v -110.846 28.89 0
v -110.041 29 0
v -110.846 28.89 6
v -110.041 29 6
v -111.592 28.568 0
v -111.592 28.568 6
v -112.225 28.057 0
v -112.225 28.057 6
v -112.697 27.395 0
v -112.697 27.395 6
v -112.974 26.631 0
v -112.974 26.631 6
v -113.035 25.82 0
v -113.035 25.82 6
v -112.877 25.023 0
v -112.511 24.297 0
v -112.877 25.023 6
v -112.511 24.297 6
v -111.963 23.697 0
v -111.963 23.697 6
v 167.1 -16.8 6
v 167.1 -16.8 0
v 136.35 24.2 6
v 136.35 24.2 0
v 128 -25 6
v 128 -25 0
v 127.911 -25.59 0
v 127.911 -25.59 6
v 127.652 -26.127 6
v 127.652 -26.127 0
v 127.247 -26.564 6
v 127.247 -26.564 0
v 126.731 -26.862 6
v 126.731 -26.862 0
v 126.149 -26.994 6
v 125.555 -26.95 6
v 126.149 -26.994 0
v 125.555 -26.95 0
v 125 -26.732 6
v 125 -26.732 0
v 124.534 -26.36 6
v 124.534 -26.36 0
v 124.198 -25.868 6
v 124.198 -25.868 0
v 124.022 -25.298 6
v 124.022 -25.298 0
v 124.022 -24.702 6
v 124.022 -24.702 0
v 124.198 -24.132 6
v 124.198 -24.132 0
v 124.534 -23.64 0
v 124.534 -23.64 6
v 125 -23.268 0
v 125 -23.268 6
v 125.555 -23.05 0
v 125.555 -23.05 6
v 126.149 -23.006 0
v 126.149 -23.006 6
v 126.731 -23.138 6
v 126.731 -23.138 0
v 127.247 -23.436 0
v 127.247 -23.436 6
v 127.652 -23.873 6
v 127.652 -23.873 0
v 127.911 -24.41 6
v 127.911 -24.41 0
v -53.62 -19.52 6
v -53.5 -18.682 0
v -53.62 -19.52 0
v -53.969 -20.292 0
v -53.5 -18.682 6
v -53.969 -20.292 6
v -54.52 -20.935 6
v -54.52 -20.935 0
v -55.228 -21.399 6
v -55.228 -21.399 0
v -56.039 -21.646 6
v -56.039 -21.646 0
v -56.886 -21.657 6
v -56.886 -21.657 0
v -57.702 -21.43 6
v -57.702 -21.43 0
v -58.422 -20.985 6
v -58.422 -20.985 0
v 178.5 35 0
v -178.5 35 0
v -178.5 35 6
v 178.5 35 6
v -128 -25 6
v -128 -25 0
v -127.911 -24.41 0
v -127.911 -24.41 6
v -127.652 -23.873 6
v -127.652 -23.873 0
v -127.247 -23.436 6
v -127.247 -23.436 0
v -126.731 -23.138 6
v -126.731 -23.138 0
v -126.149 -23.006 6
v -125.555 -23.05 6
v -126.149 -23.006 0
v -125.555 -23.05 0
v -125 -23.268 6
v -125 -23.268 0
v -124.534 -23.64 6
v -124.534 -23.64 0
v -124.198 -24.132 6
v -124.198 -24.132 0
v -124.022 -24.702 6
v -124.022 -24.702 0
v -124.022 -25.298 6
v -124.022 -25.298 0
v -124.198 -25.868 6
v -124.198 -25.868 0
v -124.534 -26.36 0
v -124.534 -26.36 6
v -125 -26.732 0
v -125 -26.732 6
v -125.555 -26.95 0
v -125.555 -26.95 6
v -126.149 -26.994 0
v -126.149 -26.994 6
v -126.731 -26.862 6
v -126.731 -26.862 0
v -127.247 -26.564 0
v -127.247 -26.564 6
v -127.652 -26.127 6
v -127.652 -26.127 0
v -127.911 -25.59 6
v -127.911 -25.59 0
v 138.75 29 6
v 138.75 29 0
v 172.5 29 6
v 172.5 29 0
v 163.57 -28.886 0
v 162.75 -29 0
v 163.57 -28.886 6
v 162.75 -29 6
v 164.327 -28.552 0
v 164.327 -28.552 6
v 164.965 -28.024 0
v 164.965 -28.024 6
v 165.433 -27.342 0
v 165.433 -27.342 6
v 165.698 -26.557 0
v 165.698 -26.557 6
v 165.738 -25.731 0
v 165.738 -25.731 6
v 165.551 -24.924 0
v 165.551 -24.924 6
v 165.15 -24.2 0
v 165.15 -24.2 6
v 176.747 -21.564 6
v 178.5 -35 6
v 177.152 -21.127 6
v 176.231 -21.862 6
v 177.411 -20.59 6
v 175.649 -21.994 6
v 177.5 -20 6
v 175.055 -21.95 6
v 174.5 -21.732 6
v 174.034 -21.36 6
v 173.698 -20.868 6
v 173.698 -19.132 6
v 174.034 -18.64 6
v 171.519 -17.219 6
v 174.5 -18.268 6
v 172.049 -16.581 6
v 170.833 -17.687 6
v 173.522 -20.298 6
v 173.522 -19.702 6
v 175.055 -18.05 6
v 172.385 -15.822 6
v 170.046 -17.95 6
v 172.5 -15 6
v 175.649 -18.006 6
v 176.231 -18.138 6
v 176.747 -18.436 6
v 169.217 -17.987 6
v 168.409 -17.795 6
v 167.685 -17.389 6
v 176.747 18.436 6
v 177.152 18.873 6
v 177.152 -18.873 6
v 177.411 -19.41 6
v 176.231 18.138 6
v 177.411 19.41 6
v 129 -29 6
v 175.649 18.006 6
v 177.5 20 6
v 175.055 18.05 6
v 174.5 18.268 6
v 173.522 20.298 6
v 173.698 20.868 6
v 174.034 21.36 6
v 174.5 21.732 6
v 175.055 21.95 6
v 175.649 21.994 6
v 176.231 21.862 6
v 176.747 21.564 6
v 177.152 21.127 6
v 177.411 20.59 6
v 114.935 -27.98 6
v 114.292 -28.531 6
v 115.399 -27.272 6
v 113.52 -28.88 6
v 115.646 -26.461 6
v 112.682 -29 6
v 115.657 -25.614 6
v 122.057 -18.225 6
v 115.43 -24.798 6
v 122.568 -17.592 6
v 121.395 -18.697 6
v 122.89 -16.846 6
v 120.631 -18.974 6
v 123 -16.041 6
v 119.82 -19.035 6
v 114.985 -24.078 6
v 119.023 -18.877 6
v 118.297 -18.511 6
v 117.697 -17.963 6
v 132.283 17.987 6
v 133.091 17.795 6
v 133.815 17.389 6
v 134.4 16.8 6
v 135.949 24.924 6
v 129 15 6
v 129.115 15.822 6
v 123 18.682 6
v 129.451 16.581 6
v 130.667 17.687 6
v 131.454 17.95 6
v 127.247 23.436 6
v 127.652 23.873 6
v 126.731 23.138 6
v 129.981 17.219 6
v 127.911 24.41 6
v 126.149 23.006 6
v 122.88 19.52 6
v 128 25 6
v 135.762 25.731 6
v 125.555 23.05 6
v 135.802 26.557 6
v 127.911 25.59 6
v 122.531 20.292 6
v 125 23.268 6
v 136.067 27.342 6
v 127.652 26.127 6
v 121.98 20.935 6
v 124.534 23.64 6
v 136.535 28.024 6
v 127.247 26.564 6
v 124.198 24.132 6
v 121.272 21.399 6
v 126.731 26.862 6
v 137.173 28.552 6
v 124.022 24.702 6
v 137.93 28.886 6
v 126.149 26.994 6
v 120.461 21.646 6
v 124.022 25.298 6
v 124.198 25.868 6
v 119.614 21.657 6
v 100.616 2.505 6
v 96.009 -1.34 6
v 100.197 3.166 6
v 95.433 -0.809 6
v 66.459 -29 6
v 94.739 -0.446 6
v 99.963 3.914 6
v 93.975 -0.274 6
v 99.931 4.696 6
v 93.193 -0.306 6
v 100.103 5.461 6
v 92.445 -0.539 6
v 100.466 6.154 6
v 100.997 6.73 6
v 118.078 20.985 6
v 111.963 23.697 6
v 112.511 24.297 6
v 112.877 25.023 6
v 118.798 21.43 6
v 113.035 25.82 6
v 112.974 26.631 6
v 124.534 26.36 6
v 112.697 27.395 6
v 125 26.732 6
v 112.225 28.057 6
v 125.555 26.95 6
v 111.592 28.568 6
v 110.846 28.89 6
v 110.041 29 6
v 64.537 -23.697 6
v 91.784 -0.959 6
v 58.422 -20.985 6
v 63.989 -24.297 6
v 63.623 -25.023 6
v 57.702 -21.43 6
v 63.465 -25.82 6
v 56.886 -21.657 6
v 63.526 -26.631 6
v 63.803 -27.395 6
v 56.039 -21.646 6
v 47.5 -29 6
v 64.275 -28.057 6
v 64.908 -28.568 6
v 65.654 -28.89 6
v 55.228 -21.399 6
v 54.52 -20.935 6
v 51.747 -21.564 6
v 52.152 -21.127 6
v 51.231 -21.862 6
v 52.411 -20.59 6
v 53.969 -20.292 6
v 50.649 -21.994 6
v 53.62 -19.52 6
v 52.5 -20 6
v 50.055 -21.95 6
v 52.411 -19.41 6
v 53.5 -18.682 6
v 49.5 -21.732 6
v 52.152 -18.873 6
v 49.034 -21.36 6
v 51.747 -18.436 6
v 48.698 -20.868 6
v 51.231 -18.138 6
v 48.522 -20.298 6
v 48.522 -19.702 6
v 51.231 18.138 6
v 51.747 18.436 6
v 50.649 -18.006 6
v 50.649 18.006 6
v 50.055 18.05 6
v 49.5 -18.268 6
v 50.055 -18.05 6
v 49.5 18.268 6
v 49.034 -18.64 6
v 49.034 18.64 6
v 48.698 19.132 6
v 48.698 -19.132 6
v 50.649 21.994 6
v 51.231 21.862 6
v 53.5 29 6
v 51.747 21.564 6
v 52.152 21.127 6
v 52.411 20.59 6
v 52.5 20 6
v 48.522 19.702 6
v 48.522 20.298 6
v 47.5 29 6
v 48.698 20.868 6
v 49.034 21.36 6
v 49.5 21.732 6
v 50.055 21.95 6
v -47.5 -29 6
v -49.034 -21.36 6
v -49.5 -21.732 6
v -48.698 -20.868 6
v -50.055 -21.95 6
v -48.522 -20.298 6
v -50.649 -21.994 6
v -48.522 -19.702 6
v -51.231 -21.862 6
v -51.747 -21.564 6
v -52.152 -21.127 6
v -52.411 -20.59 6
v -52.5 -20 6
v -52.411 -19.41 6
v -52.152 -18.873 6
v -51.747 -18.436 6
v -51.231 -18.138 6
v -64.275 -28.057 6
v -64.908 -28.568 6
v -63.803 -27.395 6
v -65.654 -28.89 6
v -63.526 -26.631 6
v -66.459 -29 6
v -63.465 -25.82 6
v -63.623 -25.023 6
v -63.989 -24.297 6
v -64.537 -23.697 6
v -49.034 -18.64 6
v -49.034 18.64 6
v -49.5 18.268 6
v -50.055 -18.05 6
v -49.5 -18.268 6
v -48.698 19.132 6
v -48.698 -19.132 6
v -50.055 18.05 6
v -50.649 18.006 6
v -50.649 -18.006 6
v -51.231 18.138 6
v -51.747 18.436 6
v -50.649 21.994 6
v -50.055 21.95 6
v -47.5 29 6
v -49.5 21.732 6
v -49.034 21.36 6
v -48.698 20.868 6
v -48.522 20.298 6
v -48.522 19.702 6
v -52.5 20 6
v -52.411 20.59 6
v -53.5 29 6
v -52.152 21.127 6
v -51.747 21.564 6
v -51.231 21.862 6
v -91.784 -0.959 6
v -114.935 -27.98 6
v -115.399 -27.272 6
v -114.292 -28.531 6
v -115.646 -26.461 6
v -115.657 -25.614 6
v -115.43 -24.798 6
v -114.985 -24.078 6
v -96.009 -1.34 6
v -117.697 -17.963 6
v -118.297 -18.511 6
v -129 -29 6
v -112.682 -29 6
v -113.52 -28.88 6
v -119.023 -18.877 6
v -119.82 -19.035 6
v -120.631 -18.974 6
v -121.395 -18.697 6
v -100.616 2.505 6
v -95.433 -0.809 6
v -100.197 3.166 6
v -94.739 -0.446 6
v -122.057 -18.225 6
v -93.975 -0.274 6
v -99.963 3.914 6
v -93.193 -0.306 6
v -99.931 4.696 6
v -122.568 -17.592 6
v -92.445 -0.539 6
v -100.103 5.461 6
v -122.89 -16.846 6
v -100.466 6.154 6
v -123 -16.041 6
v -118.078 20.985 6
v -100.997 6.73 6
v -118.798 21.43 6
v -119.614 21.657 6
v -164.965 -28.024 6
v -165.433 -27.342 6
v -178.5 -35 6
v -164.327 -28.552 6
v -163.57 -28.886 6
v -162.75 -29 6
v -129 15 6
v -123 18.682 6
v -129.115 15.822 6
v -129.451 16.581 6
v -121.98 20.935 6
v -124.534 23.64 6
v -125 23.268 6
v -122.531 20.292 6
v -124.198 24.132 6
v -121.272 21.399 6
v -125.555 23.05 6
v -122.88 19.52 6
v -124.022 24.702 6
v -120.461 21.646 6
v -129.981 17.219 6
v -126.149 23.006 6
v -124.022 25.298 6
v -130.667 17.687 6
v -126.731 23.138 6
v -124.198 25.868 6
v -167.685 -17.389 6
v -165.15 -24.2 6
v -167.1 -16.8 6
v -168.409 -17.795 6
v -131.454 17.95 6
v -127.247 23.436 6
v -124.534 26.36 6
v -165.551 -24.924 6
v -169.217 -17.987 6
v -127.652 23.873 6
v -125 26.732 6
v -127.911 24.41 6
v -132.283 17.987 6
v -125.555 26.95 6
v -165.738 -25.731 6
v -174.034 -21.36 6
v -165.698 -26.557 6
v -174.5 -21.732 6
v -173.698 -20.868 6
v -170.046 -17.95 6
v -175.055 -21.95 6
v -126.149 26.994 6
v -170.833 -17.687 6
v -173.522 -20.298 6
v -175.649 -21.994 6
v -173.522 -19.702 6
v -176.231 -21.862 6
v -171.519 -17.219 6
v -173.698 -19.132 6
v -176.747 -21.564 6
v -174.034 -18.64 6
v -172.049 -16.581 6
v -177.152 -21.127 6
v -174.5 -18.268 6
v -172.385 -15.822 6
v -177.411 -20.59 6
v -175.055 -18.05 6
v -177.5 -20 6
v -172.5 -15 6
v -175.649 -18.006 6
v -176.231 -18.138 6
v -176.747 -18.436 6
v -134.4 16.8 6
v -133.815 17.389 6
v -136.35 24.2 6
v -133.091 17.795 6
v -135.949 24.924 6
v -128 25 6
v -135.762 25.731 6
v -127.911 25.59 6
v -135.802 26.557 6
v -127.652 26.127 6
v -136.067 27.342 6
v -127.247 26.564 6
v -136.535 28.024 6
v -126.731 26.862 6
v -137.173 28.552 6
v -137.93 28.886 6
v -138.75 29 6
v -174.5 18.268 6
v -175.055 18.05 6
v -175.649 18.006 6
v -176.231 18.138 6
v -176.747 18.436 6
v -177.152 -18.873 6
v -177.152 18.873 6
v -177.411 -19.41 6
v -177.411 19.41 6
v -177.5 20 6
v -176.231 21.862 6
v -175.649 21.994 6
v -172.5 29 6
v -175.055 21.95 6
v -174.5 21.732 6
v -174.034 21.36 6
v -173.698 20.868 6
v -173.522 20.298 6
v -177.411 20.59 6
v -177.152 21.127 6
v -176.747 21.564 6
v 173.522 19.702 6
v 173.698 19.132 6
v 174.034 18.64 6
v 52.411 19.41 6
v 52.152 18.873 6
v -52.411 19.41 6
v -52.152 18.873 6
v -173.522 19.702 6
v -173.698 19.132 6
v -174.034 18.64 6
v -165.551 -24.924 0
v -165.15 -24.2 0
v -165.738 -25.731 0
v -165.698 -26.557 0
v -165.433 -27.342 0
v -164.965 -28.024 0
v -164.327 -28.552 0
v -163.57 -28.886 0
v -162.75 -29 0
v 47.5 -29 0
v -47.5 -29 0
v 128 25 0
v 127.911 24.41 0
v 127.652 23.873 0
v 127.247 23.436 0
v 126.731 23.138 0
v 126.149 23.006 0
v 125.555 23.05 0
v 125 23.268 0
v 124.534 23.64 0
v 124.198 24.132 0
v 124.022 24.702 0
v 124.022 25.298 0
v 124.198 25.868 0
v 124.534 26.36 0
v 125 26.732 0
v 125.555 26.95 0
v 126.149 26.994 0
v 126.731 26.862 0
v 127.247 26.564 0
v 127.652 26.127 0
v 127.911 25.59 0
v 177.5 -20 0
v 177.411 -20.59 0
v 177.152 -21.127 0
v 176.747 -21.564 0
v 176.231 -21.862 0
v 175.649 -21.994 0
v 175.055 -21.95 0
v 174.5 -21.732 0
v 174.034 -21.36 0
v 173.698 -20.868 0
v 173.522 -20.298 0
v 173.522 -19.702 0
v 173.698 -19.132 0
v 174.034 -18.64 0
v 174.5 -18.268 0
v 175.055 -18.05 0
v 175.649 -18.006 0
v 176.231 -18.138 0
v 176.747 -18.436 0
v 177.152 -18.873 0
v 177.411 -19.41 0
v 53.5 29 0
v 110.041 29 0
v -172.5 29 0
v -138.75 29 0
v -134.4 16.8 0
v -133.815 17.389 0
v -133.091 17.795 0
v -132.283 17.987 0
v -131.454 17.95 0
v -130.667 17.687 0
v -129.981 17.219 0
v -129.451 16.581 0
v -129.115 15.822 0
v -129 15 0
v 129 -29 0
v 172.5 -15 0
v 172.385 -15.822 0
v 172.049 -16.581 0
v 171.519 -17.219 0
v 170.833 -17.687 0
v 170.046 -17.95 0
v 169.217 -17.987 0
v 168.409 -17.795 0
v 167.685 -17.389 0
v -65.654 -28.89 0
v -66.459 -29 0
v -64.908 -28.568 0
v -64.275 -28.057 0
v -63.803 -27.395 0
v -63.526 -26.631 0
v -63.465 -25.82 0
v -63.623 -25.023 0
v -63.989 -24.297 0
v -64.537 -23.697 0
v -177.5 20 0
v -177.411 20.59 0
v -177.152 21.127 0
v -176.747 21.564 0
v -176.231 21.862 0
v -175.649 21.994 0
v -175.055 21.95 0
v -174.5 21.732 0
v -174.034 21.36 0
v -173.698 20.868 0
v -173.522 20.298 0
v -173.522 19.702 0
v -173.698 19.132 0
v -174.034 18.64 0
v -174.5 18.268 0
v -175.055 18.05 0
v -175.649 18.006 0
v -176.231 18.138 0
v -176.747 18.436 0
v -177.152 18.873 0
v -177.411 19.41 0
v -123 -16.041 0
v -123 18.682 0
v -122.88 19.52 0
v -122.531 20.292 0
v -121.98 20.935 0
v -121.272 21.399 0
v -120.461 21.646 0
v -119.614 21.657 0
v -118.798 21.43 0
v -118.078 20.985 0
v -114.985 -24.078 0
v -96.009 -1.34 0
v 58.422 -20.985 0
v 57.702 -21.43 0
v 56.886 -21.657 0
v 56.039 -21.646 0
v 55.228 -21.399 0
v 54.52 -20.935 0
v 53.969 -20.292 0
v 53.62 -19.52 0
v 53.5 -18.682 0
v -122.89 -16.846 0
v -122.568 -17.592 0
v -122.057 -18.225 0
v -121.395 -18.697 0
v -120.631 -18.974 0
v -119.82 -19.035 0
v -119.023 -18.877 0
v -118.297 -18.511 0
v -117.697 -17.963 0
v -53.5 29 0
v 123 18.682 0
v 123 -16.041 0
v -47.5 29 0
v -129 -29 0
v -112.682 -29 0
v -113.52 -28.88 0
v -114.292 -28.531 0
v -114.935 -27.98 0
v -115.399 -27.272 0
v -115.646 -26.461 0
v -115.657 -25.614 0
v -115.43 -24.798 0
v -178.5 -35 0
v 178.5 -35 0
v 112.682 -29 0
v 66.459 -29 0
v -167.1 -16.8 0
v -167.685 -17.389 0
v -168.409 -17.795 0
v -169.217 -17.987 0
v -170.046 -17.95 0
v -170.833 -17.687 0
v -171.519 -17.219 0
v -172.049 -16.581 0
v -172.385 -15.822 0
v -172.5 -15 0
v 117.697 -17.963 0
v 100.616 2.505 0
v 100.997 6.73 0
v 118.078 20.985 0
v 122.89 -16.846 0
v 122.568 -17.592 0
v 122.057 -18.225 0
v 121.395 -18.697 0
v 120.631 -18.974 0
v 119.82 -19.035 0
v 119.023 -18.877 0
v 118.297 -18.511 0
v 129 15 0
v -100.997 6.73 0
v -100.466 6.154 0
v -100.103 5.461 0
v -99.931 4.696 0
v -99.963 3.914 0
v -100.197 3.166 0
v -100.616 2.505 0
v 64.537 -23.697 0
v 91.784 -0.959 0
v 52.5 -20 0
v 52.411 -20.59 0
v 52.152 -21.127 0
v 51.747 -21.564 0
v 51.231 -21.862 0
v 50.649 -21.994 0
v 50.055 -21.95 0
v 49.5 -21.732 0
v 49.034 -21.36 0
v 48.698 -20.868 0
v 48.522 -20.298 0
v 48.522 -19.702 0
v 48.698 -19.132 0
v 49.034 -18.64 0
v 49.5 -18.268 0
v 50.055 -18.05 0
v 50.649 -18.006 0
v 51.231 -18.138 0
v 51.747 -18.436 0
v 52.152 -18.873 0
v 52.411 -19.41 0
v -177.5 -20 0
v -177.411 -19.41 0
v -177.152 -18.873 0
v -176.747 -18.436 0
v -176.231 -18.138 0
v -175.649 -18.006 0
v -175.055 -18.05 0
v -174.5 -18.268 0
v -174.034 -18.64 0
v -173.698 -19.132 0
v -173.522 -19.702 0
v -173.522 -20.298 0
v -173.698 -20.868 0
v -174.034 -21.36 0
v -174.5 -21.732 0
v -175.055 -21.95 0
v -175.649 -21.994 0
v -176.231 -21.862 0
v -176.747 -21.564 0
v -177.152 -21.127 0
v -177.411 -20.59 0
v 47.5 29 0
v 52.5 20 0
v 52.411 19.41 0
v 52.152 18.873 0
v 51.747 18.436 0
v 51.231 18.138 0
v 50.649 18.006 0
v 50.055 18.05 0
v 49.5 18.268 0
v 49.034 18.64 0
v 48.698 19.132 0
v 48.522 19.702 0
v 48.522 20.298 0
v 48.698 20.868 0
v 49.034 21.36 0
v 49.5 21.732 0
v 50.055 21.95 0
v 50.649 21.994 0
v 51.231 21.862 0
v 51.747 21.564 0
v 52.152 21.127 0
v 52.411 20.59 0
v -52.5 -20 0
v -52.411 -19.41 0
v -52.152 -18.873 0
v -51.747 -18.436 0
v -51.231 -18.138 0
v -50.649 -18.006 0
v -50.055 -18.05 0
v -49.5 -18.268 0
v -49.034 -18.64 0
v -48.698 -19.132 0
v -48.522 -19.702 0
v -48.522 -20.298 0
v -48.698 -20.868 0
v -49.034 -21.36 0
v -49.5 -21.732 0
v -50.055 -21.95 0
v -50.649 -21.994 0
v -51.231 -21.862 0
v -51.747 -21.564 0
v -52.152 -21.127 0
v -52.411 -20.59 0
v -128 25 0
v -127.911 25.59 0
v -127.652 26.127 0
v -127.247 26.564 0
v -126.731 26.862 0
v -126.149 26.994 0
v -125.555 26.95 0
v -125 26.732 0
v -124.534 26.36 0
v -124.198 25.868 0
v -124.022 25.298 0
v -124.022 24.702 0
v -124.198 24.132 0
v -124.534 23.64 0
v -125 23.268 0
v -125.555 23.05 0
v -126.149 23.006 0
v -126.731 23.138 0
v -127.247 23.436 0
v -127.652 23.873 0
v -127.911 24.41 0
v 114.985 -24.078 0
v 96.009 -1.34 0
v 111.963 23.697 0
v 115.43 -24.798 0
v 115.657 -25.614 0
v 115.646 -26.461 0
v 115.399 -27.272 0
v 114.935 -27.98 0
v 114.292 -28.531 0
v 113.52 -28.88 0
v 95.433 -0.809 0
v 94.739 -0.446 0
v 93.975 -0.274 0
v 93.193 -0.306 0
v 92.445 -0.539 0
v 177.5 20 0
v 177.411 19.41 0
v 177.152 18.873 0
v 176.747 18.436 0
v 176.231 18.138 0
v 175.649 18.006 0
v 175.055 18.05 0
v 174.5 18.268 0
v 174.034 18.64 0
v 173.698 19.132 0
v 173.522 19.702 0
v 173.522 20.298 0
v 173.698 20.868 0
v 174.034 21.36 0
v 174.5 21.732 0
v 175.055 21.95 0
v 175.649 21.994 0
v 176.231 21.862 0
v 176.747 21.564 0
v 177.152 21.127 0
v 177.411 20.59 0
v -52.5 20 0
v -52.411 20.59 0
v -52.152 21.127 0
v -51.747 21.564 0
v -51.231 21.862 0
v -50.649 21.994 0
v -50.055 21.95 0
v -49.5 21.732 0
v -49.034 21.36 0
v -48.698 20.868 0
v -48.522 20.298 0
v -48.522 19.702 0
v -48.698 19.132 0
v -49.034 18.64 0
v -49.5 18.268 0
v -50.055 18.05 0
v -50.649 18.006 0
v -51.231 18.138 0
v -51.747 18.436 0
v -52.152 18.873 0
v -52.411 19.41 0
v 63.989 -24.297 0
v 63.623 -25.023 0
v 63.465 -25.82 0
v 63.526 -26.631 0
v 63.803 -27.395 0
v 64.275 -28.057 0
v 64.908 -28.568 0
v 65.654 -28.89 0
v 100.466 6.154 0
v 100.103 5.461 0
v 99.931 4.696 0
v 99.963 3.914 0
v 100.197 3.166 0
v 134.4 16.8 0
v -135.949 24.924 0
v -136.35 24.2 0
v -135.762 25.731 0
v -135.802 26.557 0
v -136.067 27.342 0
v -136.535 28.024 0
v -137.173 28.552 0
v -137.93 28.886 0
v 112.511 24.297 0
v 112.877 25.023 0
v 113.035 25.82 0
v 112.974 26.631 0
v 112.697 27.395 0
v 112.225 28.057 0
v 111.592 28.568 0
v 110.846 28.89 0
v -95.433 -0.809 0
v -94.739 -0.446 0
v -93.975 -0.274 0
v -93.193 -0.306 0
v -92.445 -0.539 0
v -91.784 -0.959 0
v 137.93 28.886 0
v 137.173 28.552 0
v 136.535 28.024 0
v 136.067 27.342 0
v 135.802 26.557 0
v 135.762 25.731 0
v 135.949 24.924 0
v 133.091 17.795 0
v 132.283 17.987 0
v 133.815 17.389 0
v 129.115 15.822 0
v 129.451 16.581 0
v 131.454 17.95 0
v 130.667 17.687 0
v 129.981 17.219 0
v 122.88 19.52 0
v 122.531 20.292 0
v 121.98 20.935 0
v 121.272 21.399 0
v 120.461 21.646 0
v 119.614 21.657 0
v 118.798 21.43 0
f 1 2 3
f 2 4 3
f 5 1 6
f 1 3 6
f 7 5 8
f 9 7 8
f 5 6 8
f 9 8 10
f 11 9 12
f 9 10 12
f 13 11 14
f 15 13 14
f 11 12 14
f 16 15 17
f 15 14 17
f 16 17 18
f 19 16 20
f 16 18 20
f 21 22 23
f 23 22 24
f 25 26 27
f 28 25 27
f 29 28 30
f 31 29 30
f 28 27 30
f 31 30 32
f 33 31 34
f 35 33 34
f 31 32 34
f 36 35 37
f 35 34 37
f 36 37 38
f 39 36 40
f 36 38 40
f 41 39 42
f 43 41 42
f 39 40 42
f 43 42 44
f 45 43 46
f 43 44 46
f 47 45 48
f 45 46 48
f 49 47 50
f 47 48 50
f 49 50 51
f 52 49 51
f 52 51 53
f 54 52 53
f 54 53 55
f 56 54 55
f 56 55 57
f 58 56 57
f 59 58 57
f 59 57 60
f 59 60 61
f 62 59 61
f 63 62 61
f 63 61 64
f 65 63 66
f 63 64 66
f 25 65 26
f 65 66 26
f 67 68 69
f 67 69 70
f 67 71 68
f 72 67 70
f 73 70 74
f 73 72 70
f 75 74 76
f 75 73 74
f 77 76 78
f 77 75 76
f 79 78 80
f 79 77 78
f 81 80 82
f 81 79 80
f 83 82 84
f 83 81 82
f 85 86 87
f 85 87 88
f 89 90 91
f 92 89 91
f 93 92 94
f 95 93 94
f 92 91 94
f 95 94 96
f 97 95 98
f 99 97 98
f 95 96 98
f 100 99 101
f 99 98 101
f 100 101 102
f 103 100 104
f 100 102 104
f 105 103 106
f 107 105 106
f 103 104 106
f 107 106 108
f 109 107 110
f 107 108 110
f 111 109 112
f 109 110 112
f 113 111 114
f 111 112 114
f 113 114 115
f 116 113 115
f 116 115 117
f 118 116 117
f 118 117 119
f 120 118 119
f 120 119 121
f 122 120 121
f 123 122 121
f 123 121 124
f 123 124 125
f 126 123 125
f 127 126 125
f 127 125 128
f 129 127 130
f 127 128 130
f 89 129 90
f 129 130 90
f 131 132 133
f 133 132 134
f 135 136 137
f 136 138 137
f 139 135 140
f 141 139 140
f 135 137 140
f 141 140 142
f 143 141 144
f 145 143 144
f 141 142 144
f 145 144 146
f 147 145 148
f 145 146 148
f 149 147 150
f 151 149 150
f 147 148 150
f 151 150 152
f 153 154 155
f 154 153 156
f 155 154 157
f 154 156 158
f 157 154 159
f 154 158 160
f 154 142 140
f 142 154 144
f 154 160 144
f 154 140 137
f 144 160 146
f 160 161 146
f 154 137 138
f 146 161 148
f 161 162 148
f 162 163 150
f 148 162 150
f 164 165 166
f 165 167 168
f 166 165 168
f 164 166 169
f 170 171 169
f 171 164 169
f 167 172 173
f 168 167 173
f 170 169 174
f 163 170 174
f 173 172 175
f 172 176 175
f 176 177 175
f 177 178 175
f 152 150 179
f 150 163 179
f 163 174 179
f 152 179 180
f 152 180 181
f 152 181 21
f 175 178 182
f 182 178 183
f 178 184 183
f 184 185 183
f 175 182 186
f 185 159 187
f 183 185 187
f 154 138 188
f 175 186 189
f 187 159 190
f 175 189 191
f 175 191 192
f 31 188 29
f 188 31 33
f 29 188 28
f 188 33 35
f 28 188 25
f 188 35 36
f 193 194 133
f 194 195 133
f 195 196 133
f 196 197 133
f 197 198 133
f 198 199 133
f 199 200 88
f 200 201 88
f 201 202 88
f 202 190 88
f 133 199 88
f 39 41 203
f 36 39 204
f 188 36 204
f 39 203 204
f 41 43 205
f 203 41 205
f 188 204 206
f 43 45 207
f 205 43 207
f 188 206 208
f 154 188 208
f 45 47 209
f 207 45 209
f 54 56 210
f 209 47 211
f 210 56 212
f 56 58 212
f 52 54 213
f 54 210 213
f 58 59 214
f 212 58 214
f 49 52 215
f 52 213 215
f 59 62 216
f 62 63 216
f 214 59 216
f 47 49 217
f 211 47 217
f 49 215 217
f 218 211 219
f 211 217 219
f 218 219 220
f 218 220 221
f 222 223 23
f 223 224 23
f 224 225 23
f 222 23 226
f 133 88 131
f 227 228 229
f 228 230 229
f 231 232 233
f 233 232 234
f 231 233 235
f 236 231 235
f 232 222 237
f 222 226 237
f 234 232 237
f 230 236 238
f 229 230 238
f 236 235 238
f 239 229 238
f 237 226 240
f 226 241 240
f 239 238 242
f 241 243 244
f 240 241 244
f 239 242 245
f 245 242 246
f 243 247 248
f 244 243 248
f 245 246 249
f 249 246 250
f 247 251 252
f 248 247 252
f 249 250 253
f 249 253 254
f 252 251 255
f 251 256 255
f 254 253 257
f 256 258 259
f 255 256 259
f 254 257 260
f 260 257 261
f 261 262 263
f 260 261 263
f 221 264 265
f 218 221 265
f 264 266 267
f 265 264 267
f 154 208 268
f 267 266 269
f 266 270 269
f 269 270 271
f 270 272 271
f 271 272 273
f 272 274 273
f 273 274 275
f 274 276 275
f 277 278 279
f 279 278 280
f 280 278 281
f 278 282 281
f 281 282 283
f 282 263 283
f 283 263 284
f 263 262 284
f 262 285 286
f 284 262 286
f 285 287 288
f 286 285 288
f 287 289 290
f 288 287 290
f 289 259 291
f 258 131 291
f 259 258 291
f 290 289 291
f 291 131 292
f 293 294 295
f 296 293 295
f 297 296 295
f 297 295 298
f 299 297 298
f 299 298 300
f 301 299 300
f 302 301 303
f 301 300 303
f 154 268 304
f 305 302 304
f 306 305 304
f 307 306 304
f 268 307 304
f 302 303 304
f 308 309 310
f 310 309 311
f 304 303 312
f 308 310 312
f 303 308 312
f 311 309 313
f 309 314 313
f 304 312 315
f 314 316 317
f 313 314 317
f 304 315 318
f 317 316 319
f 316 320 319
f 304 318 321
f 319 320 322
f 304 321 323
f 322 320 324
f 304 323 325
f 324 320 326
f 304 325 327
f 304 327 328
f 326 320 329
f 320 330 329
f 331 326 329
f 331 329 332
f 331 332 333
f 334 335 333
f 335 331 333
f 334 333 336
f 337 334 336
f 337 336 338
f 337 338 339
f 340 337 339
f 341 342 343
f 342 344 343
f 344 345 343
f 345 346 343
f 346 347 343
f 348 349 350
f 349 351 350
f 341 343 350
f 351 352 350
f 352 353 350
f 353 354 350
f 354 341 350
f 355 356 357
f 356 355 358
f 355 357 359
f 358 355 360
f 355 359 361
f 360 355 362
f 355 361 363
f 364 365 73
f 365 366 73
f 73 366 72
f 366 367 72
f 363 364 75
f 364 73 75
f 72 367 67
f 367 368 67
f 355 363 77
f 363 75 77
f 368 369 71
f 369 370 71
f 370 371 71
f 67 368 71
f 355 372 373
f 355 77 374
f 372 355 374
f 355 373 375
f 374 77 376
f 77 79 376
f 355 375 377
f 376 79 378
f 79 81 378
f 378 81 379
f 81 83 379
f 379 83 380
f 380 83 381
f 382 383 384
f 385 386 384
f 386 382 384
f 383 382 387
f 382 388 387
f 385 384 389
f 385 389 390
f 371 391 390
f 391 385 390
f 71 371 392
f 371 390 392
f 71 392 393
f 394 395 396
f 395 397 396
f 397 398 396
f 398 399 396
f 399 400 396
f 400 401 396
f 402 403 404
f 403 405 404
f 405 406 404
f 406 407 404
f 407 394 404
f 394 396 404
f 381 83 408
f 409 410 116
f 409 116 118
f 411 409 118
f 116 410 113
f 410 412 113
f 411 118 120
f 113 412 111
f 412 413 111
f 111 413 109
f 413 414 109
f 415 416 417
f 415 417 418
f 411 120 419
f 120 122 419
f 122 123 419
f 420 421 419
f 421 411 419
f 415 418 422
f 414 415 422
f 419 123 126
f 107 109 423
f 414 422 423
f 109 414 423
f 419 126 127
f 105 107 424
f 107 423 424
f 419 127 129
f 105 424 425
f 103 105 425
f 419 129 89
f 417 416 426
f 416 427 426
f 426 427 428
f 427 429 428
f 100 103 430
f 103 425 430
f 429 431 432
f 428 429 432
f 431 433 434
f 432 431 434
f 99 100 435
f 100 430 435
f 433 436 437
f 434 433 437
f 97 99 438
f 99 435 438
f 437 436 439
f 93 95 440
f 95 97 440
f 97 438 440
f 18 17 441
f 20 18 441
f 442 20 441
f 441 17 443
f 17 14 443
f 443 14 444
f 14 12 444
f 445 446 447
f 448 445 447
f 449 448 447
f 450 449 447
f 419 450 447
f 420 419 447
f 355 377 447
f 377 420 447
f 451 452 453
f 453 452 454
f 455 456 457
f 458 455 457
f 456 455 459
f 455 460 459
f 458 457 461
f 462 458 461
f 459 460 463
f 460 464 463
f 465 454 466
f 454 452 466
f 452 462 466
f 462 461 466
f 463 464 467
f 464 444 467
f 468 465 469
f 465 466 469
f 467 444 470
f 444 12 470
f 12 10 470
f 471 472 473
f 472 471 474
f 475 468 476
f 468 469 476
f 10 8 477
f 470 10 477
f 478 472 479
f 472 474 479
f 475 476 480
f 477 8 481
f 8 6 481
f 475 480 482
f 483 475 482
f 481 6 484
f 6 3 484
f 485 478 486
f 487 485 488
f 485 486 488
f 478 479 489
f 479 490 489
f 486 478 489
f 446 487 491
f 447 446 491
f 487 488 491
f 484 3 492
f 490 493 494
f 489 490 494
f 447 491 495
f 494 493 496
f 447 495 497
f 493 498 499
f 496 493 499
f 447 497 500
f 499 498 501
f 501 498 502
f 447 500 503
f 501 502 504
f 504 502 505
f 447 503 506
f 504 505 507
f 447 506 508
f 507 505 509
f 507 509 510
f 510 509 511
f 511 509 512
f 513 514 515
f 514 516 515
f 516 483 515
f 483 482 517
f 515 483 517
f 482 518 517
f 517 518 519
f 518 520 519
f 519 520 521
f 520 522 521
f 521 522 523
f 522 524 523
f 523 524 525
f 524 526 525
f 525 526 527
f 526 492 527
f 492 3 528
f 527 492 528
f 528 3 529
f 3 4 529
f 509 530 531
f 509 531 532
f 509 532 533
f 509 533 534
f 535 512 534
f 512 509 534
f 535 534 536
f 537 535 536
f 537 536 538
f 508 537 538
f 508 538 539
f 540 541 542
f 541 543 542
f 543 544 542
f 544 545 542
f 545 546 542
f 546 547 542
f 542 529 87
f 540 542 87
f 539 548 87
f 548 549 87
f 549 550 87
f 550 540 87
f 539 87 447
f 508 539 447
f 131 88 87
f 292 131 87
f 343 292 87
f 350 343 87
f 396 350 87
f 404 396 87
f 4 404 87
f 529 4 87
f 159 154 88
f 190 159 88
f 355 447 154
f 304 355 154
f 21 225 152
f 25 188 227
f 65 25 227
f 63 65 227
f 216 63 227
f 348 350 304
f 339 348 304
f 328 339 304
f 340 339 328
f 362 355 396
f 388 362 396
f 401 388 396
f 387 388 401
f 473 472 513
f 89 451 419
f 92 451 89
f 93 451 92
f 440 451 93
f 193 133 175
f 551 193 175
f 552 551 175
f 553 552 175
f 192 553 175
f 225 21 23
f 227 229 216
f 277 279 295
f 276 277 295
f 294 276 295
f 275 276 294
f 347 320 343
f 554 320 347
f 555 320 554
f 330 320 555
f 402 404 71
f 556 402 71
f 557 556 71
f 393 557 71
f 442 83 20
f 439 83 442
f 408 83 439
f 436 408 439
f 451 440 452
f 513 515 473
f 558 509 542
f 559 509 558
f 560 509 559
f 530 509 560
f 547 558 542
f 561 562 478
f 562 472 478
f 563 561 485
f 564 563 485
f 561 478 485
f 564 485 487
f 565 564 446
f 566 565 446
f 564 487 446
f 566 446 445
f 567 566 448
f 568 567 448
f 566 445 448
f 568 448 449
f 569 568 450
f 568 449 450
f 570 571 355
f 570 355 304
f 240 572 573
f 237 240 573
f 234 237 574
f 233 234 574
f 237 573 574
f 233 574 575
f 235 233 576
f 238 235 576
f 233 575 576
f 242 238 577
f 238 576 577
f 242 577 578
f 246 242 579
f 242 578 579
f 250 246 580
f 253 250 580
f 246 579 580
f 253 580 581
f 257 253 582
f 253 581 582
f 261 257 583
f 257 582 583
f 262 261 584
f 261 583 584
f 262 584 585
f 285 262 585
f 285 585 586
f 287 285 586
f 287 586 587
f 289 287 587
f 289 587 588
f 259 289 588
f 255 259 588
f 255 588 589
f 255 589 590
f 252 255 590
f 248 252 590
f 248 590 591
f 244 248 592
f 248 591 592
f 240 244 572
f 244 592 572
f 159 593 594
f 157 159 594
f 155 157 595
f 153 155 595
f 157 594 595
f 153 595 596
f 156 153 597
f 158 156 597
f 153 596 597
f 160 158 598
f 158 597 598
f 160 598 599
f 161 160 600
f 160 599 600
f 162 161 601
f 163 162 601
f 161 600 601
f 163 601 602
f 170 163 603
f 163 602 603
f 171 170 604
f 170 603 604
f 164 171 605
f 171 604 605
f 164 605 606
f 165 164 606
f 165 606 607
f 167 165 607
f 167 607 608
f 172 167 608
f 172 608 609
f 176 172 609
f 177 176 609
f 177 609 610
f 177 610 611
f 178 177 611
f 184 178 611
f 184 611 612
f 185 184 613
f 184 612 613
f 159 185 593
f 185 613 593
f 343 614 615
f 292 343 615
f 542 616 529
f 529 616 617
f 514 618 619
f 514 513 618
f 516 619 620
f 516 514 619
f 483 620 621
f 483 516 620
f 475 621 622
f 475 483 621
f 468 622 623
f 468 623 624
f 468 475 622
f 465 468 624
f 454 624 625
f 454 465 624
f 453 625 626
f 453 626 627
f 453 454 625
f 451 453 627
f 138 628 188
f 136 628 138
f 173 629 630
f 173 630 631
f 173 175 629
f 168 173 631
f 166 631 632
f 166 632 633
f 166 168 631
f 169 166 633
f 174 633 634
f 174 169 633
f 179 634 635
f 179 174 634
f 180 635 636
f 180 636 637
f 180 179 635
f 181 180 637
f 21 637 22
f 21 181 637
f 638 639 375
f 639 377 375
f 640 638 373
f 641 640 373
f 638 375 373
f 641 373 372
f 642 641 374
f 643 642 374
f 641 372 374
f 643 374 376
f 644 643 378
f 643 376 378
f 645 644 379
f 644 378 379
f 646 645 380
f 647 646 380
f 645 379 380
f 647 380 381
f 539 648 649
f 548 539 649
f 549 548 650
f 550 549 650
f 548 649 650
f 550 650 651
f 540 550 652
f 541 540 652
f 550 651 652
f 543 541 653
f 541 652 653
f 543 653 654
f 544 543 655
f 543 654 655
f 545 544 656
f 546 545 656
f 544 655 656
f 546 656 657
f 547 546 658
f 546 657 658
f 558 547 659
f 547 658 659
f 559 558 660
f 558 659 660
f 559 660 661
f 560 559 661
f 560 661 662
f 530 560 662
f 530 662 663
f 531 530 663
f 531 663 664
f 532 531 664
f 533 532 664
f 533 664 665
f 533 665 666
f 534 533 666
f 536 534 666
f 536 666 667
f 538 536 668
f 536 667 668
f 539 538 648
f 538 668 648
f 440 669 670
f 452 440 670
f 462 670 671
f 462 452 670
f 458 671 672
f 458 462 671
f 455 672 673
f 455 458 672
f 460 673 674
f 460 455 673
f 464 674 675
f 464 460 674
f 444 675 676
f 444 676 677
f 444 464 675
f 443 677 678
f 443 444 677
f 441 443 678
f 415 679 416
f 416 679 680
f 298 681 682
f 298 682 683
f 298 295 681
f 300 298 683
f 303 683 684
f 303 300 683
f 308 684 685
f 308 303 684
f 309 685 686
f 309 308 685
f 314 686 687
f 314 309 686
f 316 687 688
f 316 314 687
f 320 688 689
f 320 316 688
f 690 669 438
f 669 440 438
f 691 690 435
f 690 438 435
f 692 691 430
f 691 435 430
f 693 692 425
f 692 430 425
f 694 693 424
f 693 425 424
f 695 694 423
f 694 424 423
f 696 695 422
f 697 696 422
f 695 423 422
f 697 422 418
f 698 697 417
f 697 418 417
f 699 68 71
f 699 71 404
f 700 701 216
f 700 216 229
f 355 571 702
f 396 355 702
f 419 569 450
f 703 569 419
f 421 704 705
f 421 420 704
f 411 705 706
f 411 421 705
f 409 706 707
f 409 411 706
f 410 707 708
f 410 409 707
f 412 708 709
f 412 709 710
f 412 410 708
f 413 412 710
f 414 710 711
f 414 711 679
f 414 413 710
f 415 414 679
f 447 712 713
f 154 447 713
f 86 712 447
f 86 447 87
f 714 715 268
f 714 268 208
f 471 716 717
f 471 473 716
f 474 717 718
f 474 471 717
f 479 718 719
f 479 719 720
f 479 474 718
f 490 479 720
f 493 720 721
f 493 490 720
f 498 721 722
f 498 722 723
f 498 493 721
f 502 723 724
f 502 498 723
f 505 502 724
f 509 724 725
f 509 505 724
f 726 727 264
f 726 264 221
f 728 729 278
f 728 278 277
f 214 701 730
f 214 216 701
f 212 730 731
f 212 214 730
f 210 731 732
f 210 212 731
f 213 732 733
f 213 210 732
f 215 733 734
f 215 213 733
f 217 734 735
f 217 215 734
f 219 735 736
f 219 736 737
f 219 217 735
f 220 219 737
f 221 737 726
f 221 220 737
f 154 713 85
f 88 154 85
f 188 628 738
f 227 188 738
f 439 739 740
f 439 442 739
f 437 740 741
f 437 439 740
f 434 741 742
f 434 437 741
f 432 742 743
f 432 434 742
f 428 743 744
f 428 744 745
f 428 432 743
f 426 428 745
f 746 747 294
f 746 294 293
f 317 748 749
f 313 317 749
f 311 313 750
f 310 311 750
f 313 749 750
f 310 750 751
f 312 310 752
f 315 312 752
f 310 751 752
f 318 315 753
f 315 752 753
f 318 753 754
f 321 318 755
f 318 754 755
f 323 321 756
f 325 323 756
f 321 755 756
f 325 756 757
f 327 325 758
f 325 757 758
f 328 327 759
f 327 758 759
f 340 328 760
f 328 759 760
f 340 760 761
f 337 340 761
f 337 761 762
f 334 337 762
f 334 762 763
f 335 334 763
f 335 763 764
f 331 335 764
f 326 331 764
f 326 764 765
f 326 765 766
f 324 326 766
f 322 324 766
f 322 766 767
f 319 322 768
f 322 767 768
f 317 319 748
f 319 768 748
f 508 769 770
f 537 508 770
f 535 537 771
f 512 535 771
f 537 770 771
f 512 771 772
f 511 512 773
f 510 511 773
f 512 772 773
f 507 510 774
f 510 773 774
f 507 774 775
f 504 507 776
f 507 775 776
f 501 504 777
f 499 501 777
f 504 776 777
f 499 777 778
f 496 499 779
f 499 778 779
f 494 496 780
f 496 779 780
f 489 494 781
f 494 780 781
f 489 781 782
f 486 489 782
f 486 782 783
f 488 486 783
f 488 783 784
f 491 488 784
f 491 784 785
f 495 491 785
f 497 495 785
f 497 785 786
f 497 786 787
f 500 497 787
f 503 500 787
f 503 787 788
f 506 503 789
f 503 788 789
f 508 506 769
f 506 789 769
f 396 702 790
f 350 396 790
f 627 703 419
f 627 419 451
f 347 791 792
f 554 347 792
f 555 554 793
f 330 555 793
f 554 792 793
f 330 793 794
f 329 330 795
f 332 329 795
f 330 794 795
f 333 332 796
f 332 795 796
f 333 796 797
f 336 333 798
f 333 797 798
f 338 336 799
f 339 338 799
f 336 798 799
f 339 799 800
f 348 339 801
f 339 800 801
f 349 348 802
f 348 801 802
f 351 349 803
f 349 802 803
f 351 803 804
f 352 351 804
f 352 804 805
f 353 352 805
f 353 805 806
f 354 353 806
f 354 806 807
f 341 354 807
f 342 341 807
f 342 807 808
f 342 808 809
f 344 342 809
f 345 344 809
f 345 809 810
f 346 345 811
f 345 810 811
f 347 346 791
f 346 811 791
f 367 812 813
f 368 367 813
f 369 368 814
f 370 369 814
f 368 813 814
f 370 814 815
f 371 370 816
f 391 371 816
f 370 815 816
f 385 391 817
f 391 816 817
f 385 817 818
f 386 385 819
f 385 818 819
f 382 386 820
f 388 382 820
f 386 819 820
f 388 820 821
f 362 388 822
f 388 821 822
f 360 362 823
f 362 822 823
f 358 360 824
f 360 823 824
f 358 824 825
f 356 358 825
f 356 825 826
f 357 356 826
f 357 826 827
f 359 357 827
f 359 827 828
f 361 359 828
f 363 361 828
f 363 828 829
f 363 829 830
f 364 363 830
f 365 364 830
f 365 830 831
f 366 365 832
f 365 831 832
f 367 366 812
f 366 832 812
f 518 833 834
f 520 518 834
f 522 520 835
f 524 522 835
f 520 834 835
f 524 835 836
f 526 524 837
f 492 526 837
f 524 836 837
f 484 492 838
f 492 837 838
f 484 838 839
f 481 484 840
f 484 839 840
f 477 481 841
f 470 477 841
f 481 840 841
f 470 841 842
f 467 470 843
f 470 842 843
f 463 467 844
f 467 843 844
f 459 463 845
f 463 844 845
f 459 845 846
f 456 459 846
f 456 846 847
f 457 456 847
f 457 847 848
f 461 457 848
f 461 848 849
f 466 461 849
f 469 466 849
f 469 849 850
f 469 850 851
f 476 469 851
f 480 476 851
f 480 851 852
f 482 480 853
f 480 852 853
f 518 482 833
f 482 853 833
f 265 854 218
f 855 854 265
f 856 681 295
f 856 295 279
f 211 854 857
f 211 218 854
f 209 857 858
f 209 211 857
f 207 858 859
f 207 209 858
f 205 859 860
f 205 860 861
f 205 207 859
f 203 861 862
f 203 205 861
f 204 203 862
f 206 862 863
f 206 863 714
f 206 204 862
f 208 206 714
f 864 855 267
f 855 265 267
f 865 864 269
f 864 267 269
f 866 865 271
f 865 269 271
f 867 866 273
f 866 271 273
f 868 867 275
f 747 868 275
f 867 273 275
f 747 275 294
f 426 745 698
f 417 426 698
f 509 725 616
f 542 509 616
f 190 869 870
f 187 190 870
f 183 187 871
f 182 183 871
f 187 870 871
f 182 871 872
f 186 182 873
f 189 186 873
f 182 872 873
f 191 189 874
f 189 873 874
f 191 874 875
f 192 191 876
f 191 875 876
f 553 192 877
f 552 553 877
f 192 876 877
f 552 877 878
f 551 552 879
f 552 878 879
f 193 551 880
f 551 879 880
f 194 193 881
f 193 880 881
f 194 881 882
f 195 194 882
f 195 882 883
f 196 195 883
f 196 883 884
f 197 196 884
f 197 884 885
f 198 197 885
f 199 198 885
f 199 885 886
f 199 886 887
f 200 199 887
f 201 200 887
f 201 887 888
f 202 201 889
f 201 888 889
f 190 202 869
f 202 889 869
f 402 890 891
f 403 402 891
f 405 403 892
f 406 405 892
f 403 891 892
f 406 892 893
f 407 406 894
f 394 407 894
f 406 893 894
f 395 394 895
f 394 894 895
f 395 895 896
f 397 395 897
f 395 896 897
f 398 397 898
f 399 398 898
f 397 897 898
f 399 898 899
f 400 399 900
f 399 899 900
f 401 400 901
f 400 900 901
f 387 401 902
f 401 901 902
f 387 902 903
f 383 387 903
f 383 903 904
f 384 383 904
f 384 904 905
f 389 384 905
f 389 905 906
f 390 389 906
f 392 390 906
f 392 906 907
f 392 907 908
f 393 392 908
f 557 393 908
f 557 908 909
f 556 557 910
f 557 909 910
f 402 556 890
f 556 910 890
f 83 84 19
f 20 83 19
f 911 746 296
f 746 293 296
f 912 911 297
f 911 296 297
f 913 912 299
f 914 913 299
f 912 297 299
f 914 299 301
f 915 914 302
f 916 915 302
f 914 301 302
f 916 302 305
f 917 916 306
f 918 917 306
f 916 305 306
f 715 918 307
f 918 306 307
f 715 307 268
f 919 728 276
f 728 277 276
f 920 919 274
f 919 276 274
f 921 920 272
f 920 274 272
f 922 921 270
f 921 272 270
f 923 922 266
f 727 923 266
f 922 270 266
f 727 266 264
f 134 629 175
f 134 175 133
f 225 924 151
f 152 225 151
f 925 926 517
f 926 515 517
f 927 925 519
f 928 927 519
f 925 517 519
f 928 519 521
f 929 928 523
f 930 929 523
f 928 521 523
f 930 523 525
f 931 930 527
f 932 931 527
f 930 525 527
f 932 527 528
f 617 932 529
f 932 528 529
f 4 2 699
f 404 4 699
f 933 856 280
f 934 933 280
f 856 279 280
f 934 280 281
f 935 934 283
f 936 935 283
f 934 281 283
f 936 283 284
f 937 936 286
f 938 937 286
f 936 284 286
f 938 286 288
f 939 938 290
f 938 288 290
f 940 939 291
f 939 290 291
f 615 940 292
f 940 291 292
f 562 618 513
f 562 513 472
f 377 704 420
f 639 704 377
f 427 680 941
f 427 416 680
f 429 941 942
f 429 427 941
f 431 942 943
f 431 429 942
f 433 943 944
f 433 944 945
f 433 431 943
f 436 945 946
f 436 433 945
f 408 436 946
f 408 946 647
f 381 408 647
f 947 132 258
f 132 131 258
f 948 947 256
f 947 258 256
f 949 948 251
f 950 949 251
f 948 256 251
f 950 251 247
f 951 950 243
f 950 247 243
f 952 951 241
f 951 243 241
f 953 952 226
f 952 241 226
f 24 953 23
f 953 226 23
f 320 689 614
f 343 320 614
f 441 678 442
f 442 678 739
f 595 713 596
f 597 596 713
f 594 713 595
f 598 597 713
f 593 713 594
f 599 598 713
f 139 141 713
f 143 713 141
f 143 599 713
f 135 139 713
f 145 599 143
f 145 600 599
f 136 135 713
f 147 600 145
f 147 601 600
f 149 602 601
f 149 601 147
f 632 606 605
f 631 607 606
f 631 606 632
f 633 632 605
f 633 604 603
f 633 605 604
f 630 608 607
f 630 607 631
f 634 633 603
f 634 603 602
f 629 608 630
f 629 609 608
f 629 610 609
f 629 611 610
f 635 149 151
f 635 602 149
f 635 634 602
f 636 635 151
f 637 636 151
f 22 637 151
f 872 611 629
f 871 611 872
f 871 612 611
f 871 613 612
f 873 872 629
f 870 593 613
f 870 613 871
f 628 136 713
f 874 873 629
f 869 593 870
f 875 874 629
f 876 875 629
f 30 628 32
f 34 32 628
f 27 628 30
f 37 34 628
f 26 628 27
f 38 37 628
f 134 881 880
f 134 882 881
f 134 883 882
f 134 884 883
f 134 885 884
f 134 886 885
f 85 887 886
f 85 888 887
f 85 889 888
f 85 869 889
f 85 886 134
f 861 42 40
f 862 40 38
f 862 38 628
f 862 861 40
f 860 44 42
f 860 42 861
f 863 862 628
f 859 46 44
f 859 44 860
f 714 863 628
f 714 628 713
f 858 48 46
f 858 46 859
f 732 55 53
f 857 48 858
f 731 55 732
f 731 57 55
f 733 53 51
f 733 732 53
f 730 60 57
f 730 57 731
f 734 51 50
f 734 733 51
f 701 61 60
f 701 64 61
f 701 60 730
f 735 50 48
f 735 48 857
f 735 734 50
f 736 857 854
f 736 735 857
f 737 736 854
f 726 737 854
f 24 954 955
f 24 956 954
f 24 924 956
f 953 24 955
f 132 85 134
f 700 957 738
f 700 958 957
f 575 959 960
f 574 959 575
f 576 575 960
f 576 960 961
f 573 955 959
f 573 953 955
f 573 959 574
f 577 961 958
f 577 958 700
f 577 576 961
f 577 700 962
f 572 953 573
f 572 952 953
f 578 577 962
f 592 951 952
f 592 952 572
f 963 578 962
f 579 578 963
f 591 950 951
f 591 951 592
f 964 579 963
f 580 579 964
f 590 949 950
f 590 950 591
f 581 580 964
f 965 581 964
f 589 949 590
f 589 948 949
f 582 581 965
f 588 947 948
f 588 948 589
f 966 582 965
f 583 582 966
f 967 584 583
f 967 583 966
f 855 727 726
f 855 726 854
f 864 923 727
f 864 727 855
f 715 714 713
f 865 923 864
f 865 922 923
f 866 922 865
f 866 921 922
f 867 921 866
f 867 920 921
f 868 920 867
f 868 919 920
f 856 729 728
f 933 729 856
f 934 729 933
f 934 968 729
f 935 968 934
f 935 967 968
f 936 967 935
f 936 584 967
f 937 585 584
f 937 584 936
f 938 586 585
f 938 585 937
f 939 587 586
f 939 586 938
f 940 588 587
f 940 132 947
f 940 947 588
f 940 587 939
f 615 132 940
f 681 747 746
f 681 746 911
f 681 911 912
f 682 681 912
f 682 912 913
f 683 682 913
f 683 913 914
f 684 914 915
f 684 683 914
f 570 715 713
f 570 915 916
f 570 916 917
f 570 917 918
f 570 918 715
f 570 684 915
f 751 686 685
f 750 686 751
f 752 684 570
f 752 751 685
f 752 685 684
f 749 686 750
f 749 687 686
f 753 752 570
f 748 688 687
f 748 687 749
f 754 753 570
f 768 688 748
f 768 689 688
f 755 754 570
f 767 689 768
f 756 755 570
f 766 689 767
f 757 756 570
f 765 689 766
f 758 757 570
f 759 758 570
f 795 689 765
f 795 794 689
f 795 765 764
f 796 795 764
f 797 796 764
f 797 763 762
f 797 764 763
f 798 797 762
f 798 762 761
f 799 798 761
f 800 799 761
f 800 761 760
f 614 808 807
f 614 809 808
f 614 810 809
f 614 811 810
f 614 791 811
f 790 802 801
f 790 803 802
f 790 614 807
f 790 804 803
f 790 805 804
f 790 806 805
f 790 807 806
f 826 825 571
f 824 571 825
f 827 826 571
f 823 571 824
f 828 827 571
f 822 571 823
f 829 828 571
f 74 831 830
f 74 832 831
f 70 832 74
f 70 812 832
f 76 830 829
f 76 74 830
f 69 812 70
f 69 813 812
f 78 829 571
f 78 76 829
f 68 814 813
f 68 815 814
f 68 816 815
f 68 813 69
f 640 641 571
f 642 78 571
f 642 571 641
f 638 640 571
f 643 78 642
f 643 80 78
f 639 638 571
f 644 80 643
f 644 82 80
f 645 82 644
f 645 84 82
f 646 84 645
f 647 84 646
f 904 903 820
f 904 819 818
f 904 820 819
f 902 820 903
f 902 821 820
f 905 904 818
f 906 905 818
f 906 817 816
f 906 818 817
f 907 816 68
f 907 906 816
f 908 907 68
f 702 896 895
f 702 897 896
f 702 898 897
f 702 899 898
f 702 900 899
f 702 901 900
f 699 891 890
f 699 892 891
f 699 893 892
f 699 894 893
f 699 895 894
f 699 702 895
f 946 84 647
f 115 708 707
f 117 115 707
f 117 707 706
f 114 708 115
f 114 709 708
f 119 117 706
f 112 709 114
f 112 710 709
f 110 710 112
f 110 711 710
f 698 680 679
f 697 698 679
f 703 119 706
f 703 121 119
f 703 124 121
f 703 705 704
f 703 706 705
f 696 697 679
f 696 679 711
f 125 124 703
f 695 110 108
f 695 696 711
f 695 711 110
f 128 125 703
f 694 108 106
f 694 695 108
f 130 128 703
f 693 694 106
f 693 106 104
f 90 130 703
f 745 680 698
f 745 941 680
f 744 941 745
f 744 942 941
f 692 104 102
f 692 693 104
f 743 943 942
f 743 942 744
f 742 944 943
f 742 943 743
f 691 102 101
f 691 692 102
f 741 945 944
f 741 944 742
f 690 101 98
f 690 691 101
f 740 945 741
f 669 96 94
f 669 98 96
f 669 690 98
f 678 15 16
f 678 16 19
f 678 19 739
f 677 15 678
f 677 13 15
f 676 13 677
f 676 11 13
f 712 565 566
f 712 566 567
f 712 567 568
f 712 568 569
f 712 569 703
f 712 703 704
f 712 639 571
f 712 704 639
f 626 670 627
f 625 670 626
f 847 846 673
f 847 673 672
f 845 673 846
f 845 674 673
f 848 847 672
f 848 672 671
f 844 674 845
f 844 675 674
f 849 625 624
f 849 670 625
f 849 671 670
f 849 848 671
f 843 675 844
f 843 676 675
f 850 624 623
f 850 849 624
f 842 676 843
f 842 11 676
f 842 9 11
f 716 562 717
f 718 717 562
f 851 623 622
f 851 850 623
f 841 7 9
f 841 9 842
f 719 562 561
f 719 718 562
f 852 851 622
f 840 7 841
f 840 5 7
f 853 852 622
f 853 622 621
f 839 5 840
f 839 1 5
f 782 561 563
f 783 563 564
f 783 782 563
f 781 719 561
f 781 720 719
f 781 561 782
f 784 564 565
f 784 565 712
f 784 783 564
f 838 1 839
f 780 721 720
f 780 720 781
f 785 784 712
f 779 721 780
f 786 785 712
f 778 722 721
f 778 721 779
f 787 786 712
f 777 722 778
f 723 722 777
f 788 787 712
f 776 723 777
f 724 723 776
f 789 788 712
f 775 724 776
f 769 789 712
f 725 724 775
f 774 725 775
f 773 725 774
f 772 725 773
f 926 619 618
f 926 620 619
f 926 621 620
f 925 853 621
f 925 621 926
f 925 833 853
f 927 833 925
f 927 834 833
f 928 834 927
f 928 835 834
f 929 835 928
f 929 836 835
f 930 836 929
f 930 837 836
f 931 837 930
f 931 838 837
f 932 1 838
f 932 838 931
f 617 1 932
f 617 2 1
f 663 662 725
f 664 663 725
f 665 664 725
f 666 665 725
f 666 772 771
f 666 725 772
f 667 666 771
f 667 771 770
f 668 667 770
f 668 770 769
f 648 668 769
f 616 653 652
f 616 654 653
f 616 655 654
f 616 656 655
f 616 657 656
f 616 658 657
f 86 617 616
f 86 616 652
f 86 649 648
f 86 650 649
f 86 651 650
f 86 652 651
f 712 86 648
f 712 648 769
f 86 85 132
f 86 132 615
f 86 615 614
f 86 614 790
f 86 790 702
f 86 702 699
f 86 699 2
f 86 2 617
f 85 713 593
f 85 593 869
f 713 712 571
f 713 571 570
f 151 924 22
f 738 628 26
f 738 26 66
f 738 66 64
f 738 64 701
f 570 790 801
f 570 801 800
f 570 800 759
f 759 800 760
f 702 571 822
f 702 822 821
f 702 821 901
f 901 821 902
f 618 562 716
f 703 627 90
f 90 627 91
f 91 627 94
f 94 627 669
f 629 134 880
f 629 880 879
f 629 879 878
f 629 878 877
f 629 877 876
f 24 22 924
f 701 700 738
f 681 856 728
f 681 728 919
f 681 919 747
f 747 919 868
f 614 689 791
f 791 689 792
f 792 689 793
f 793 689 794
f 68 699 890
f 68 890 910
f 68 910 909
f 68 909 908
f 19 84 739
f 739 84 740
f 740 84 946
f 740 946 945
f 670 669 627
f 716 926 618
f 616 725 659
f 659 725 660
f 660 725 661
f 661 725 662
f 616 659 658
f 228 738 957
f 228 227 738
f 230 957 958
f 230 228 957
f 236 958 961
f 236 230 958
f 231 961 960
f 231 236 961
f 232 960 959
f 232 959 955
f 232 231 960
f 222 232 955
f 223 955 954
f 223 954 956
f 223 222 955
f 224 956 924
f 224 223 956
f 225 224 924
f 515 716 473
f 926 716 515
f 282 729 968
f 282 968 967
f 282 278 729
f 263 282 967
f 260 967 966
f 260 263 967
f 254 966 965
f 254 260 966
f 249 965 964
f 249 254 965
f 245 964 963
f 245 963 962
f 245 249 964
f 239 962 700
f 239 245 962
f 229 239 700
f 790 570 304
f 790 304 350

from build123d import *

# Parameters (mm, degrees)
SKETCH_2_W          = 357
SKETCH_2_H          = 70
SKETCH_2_W_2        = 345
SKETCH_2_H_2        = 58
EXTRUDE_1_DEPTH     = 6
SKETCH_3_W          = 6
SKETCH_3_H          = 58
EXTRUDE_2_DEPTH     = 6
EXTRUDE_3_DEPTH     = 6
FILLET_1_R          = 3
SKETCH_5_W          = 6
SKETCH_5_H          = 58
EXTRUDE_4_DEPTH     = 6
EXTRUDE_5_DEPTH     = 6
FILLET_2_R          = 3
SKETCH_7_R          = 2
CUT_EXTRUDE_1_DEPTH = 6


with BuildPart() as part:
    # 草图2 → 凸台-拉伸1 (new body)
    with BuildSketch(Plane.XY):
        Rectangle(SKETCH_2_W, SKETCH_2_H)
        Rectangle(SKETCH_2_W_2, SKETCH_2_H_2, mode=Mode.SUBTRACT)
    extrude(amount=EXTRUDE_1_DEPTH)

    # 草图3 → 凸台-拉伸2 (add)
    with BuildSketch(Plane.XY):
        with Locations((-126, 0)):
            Rectangle(SKETCH_3_W, SKETCH_3_H)
        with Locations((126, 0)):
            Rectangle(SKETCH_3_W, SKETCH_3_H)
    extrude(amount=EXTRUDE_2_DEPTH)

    # 草图4 → 凸台-拉伸3 (add)
    with BuildSketch(Plane.XY):
        Polygon((-172.5, -29), (-172.5, -24), (-132.75, 29), (-129, 29), (-129, 24), (-168.75, -29), align=None)
        Polygon((129, 24), (168.75, -29), (172.5, -29), (172.5, -24), (132.75, 29), (129, 29), align=None)
    extrude(amount=EXTRUDE_3_DEPTH)

    # 圆角1
    fillet_1_edges = [part.edges().sort_by_distance(p)[0] for p in [
        (-168.75, -29, 3),
        (-129, 24, 3),
        (-132.75, 29, 3),
        (-172.5, -24, 3),
        (129, 24, 3),
        (168.75, -29, 3),
        (172.5, -24, 3),
        (132.75, 29, 3),
    ]]
    fillet(fillet_1_edges, radius=FILLET_1_R)

    # 草图5 → 凸台-拉伸4 (add)
    with BuildSketch(Plane.XY):
        with Locations((50.5, 0)):
            Rectangle(SKETCH_5_W, SKETCH_5_H)
        with Locations((-50.5, 0)):
            Rectangle(SKETCH_5_W, SKETCH_5_H)
    extrude(amount=EXTRUDE_4_DEPTH)

    # 草图6 → 凸台-拉伸5 (add)
    with BuildSketch(Plane.XY):
        Polygon((123, 29), (123, 25.092571363), (98.693529244, 4.808034617), (123, -24.317822582), (123, -29), (119.092571363, -29), (94.086919201, 0.963669401), (58.182177418, -29), (53.5, -29), (53.5, -25.092571363), (118.317822582, 29), align=None)
        Polygon((-119.092571363, -29), (-94.086919201, 0.963669401), (-58.182177418, -29), (-53.5, -29), (-53.5, -25.092571363), (-118.317822582, 29), (-123, 29), (-123, 25.092571363), (-98.693529244, 4.808034617), (-123, -24.317822582), (-123, -29), align=None)
    extrude(amount=EXTRUDE_5_DEPTH)

    # 圆角2
    fillet_2_edges = [part.edges().sort_by_distance(p)[0] for p in [
        (118.317822582, 29, 3),
        (53.5, -25.092571363, 3),
        (58.182177418, -29, 3),
        (94.086919201, 0.963669401, 3),
        (119.092571363, -29, 3),
        (123, -24.317822582, 3),
        (98.693529244, 4.808034617, 3),
        (123, 25.092571363, 3),
        (-119.092571363, -29, 3),
        (-94.086919201, 0.963669401, 3),
        (-58.182177418, -29, 3),
        (-53.5, -25.092571363, 3),
        (-118.317822582, 29, 3),
        (-123, 25.092571363, 3),
        (-98.693529244, 4.808034617, 3),
        (-123, -24.317822582, 3),
    ]]
    fillet(fillet_2_edges, radius=FILLET_2_R)

    # 草图7 → 切除-拉伸1 (cut)
    with BuildSketch(Plane(origin=(0, 0, 0), x_dir=(-1, 0, 0), z_dir=(0, 0, -1))):
        with Locations((175.5, 20)):
            Circle(SKETCH_7_R)
        with Locations((175.5, -20)):
            Circle(SKETCH_7_R)
        with Locations((50.5, 20)):
            Circle(SKETCH_7_R)
        with Locations((50.5, -20)):
            Circle(SKETCH_7_R)
        with Locations(Location((-175.5, -20, 0), (0, 0, 180))):
            Circle(SKETCH_7_R)
        with Locations(Location((-175.5, 20, 0), (0, 0, 180))):
            Circle(SKETCH_7_R)
        with Locations(Location((-50.5, -20, 0), (0, 0, 180))):
            Circle(SKETCH_7_R)
        with Locations(Location((-50.5, 20, 0), (0, 0, 180))):
            Circle(SKETCH_7_R)
        with Locations((126, 25)):
            Circle(SKETCH_7_R)
        with Locations((126, -25)):
            Circle(SKETCH_7_R)
        with Locations(Location((-126, -25, 0), (0, 0, 180))):
            Circle(SKETCH_7_R)
        with Locations(Location((-126, 25, 0), (0, 0, 180))):
            Circle(SKETCH_7_R)
    extrude(amount=-CUT_EXTRUDE_1_DEPTH, mode=Mode.SUBTRACT)


solid = part.part
